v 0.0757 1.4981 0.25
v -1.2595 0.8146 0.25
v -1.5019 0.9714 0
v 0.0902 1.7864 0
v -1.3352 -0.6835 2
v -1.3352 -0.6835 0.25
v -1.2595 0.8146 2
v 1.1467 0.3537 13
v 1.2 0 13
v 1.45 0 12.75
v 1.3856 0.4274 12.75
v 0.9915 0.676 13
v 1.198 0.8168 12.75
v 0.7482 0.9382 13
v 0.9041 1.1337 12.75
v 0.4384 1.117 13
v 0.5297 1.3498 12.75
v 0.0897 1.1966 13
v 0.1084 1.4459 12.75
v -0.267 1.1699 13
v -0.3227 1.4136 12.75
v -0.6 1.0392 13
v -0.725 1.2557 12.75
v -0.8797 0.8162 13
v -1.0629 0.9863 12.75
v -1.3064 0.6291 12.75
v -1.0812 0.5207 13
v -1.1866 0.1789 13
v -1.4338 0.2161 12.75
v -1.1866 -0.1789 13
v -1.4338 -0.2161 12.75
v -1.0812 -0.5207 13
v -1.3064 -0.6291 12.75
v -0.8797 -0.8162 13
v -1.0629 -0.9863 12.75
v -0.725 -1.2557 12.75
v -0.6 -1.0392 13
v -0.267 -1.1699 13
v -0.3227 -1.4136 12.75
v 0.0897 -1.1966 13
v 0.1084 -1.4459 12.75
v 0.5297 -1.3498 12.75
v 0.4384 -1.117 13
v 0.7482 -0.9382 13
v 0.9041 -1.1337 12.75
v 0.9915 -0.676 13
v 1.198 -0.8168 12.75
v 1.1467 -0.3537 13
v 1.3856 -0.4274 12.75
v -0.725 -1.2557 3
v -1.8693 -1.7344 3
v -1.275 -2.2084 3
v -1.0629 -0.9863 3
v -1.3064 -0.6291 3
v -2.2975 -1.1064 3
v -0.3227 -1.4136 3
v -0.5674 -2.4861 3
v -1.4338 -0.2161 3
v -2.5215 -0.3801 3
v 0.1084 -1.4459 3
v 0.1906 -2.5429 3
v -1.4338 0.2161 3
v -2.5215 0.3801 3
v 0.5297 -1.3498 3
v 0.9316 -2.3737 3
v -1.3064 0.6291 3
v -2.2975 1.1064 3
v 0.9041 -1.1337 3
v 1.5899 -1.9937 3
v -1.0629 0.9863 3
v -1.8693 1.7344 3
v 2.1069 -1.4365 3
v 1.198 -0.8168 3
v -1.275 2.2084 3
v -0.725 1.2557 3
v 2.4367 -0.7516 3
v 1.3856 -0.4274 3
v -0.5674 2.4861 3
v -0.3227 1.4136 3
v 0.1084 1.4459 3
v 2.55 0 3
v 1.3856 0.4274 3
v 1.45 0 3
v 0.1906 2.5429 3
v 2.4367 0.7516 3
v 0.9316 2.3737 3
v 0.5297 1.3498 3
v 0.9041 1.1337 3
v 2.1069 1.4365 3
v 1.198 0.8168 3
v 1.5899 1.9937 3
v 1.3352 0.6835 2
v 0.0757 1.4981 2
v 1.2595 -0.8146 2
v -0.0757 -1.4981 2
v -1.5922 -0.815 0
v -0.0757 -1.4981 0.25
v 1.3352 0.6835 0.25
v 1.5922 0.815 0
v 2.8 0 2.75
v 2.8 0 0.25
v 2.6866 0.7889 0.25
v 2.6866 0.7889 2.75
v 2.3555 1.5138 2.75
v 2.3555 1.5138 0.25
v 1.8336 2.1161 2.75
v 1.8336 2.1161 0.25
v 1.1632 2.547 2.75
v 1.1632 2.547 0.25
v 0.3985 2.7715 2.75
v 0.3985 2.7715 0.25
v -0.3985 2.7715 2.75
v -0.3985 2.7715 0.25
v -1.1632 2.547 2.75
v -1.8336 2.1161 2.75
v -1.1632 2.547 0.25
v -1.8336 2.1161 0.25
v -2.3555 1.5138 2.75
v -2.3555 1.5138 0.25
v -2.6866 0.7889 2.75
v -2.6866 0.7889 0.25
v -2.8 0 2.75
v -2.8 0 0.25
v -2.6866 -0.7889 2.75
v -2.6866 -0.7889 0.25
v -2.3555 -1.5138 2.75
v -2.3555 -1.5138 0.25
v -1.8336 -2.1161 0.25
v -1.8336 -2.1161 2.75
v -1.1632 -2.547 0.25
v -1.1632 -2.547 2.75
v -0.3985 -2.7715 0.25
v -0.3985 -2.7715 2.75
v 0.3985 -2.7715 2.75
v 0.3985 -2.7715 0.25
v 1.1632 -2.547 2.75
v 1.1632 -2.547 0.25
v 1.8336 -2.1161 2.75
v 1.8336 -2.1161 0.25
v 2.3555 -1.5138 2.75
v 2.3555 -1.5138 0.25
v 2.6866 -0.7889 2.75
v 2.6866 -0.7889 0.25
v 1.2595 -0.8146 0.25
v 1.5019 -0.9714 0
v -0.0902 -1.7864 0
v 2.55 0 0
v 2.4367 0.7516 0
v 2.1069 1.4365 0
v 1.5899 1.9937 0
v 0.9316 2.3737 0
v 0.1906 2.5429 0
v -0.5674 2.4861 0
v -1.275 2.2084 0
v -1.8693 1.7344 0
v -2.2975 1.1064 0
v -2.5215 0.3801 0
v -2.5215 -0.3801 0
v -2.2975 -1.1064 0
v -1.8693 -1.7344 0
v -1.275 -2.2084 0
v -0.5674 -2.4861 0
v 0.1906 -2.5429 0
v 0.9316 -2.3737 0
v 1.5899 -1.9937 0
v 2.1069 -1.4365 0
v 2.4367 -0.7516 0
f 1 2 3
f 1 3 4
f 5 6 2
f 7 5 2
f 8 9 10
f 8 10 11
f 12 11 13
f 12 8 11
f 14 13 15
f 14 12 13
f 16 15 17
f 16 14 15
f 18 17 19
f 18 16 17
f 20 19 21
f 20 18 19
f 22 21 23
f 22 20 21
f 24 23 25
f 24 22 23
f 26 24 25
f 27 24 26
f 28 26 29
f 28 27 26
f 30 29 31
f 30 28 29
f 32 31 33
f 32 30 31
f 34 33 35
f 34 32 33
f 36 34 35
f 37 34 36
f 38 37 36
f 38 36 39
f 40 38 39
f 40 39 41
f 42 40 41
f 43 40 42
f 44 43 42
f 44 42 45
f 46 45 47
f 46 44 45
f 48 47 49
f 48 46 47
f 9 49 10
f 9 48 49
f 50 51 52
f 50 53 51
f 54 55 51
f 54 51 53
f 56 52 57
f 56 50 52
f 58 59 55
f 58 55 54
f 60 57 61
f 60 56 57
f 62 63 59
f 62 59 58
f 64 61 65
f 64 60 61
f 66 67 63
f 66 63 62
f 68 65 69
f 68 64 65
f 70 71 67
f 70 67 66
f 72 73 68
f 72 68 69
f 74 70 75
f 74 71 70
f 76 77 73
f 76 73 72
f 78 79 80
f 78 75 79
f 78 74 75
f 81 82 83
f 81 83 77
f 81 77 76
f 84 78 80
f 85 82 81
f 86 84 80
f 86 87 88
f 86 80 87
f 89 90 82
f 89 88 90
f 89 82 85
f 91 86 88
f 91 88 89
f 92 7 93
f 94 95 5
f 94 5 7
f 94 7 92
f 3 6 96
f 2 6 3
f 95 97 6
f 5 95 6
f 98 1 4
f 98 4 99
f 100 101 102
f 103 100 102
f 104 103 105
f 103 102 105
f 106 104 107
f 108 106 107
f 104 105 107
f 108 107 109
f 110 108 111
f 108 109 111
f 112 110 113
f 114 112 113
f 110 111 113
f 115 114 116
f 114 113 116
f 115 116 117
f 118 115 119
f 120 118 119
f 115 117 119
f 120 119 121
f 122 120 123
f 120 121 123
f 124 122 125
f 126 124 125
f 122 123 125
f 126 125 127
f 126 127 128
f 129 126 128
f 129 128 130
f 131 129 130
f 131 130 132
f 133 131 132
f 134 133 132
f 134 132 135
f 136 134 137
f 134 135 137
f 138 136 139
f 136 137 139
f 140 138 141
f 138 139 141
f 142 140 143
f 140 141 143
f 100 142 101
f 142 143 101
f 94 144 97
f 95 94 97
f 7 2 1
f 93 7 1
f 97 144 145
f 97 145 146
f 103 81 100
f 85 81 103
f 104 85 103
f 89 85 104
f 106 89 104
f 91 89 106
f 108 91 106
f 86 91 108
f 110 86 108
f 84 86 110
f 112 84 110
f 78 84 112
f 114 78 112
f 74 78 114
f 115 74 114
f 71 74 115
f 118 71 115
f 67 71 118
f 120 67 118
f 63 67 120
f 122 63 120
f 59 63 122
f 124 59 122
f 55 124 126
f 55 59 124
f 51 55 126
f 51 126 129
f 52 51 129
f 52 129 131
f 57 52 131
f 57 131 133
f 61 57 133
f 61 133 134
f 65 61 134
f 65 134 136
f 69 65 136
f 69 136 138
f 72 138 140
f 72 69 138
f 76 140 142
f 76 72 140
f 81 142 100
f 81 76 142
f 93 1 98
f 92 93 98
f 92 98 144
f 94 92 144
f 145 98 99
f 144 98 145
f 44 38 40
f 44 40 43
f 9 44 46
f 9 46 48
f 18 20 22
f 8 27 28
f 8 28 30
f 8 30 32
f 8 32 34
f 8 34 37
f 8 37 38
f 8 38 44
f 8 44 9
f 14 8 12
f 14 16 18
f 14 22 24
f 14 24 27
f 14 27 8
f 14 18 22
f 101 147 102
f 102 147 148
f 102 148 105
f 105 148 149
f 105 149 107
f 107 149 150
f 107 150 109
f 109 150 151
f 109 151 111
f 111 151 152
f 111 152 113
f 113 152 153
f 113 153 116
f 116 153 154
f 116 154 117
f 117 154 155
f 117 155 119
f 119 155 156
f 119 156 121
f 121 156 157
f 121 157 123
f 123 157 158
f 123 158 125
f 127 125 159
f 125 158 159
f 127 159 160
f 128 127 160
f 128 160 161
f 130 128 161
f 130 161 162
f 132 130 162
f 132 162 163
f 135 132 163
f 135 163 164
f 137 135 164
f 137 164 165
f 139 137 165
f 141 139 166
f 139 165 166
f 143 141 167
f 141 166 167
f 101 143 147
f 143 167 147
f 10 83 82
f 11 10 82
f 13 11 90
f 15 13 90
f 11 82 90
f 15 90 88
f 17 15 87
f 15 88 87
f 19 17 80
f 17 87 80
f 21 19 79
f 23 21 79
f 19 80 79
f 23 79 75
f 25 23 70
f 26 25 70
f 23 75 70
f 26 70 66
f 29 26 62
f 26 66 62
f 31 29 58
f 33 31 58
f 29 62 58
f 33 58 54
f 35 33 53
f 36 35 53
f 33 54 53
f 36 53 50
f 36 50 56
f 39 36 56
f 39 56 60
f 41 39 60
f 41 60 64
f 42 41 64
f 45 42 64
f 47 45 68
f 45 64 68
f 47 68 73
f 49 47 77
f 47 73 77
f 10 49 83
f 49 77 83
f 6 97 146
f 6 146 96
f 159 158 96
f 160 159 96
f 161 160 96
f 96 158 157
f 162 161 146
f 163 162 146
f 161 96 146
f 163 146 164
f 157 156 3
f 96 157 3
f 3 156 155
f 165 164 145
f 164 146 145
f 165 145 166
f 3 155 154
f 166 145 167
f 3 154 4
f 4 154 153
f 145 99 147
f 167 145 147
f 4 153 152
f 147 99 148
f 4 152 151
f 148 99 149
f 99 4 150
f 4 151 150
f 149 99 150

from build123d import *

# Parameters (mm, degrees)
SKETCH_R     = 2.8
PAD_DEPTH    = 3
SKETCH001_R  = 1.45
PAD001_DEPTH = 10
POCKET_DEPTH = 2
CHAMFER_SIZE = 0.25


with BuildPart() as part:
    # Sketch → Pad (new body)
    with BuildSketch(Plane.XY):
        Circle(SKETCH_R)
    extrude(amount=PAD_DEPTH)

    # Sketch001 (on Face3 of Pad) → Pad001 (join)
    with BuildSketch(Plane.XY.offset(3)):
        Circle(SKETCH001_R)
    extrude(amount=PAD001_DEPTH)

    # Sketch002 (on Face2 of Pad001) → Pocket (cut)
    with BuildSketch(Plane(origin=(0, 0, 0), x_dir=(1, 0, 0), z_dir=(0, 0, -1))):
        Polygon((1.259542, 0.814588), (-0.075682, 1.49809), (-1.335225, 0.683502), (-1.259542, -0.814588), (0.075682, -1.49809), (1.335225, -0.683502), align=None)
    extrude(amount=-POCKET_DEPTH, mode=Mode.SUBTRACT)

    # Chamfer
    chamfer_edges = [part.edges().sort_by_distance(p)[0] for p in [
        (-2.8, 0, 3),
        (-2.8, 0, 0),
        (1.297384, -0.065543, 0),
        (0.705454, 1.090796, 0),
        (-0.59193, 1.156339, 0),
        (-1.297384, 0.065543, 0),
        (-0.705454, -1.090796, 0),
        (0.59193, -1.156339, 0),
        (-1.45, 0, 13),
    ]]
    chamfer(chamfer_edges, length=CHAMFER_SIZE)


solid = part.part
